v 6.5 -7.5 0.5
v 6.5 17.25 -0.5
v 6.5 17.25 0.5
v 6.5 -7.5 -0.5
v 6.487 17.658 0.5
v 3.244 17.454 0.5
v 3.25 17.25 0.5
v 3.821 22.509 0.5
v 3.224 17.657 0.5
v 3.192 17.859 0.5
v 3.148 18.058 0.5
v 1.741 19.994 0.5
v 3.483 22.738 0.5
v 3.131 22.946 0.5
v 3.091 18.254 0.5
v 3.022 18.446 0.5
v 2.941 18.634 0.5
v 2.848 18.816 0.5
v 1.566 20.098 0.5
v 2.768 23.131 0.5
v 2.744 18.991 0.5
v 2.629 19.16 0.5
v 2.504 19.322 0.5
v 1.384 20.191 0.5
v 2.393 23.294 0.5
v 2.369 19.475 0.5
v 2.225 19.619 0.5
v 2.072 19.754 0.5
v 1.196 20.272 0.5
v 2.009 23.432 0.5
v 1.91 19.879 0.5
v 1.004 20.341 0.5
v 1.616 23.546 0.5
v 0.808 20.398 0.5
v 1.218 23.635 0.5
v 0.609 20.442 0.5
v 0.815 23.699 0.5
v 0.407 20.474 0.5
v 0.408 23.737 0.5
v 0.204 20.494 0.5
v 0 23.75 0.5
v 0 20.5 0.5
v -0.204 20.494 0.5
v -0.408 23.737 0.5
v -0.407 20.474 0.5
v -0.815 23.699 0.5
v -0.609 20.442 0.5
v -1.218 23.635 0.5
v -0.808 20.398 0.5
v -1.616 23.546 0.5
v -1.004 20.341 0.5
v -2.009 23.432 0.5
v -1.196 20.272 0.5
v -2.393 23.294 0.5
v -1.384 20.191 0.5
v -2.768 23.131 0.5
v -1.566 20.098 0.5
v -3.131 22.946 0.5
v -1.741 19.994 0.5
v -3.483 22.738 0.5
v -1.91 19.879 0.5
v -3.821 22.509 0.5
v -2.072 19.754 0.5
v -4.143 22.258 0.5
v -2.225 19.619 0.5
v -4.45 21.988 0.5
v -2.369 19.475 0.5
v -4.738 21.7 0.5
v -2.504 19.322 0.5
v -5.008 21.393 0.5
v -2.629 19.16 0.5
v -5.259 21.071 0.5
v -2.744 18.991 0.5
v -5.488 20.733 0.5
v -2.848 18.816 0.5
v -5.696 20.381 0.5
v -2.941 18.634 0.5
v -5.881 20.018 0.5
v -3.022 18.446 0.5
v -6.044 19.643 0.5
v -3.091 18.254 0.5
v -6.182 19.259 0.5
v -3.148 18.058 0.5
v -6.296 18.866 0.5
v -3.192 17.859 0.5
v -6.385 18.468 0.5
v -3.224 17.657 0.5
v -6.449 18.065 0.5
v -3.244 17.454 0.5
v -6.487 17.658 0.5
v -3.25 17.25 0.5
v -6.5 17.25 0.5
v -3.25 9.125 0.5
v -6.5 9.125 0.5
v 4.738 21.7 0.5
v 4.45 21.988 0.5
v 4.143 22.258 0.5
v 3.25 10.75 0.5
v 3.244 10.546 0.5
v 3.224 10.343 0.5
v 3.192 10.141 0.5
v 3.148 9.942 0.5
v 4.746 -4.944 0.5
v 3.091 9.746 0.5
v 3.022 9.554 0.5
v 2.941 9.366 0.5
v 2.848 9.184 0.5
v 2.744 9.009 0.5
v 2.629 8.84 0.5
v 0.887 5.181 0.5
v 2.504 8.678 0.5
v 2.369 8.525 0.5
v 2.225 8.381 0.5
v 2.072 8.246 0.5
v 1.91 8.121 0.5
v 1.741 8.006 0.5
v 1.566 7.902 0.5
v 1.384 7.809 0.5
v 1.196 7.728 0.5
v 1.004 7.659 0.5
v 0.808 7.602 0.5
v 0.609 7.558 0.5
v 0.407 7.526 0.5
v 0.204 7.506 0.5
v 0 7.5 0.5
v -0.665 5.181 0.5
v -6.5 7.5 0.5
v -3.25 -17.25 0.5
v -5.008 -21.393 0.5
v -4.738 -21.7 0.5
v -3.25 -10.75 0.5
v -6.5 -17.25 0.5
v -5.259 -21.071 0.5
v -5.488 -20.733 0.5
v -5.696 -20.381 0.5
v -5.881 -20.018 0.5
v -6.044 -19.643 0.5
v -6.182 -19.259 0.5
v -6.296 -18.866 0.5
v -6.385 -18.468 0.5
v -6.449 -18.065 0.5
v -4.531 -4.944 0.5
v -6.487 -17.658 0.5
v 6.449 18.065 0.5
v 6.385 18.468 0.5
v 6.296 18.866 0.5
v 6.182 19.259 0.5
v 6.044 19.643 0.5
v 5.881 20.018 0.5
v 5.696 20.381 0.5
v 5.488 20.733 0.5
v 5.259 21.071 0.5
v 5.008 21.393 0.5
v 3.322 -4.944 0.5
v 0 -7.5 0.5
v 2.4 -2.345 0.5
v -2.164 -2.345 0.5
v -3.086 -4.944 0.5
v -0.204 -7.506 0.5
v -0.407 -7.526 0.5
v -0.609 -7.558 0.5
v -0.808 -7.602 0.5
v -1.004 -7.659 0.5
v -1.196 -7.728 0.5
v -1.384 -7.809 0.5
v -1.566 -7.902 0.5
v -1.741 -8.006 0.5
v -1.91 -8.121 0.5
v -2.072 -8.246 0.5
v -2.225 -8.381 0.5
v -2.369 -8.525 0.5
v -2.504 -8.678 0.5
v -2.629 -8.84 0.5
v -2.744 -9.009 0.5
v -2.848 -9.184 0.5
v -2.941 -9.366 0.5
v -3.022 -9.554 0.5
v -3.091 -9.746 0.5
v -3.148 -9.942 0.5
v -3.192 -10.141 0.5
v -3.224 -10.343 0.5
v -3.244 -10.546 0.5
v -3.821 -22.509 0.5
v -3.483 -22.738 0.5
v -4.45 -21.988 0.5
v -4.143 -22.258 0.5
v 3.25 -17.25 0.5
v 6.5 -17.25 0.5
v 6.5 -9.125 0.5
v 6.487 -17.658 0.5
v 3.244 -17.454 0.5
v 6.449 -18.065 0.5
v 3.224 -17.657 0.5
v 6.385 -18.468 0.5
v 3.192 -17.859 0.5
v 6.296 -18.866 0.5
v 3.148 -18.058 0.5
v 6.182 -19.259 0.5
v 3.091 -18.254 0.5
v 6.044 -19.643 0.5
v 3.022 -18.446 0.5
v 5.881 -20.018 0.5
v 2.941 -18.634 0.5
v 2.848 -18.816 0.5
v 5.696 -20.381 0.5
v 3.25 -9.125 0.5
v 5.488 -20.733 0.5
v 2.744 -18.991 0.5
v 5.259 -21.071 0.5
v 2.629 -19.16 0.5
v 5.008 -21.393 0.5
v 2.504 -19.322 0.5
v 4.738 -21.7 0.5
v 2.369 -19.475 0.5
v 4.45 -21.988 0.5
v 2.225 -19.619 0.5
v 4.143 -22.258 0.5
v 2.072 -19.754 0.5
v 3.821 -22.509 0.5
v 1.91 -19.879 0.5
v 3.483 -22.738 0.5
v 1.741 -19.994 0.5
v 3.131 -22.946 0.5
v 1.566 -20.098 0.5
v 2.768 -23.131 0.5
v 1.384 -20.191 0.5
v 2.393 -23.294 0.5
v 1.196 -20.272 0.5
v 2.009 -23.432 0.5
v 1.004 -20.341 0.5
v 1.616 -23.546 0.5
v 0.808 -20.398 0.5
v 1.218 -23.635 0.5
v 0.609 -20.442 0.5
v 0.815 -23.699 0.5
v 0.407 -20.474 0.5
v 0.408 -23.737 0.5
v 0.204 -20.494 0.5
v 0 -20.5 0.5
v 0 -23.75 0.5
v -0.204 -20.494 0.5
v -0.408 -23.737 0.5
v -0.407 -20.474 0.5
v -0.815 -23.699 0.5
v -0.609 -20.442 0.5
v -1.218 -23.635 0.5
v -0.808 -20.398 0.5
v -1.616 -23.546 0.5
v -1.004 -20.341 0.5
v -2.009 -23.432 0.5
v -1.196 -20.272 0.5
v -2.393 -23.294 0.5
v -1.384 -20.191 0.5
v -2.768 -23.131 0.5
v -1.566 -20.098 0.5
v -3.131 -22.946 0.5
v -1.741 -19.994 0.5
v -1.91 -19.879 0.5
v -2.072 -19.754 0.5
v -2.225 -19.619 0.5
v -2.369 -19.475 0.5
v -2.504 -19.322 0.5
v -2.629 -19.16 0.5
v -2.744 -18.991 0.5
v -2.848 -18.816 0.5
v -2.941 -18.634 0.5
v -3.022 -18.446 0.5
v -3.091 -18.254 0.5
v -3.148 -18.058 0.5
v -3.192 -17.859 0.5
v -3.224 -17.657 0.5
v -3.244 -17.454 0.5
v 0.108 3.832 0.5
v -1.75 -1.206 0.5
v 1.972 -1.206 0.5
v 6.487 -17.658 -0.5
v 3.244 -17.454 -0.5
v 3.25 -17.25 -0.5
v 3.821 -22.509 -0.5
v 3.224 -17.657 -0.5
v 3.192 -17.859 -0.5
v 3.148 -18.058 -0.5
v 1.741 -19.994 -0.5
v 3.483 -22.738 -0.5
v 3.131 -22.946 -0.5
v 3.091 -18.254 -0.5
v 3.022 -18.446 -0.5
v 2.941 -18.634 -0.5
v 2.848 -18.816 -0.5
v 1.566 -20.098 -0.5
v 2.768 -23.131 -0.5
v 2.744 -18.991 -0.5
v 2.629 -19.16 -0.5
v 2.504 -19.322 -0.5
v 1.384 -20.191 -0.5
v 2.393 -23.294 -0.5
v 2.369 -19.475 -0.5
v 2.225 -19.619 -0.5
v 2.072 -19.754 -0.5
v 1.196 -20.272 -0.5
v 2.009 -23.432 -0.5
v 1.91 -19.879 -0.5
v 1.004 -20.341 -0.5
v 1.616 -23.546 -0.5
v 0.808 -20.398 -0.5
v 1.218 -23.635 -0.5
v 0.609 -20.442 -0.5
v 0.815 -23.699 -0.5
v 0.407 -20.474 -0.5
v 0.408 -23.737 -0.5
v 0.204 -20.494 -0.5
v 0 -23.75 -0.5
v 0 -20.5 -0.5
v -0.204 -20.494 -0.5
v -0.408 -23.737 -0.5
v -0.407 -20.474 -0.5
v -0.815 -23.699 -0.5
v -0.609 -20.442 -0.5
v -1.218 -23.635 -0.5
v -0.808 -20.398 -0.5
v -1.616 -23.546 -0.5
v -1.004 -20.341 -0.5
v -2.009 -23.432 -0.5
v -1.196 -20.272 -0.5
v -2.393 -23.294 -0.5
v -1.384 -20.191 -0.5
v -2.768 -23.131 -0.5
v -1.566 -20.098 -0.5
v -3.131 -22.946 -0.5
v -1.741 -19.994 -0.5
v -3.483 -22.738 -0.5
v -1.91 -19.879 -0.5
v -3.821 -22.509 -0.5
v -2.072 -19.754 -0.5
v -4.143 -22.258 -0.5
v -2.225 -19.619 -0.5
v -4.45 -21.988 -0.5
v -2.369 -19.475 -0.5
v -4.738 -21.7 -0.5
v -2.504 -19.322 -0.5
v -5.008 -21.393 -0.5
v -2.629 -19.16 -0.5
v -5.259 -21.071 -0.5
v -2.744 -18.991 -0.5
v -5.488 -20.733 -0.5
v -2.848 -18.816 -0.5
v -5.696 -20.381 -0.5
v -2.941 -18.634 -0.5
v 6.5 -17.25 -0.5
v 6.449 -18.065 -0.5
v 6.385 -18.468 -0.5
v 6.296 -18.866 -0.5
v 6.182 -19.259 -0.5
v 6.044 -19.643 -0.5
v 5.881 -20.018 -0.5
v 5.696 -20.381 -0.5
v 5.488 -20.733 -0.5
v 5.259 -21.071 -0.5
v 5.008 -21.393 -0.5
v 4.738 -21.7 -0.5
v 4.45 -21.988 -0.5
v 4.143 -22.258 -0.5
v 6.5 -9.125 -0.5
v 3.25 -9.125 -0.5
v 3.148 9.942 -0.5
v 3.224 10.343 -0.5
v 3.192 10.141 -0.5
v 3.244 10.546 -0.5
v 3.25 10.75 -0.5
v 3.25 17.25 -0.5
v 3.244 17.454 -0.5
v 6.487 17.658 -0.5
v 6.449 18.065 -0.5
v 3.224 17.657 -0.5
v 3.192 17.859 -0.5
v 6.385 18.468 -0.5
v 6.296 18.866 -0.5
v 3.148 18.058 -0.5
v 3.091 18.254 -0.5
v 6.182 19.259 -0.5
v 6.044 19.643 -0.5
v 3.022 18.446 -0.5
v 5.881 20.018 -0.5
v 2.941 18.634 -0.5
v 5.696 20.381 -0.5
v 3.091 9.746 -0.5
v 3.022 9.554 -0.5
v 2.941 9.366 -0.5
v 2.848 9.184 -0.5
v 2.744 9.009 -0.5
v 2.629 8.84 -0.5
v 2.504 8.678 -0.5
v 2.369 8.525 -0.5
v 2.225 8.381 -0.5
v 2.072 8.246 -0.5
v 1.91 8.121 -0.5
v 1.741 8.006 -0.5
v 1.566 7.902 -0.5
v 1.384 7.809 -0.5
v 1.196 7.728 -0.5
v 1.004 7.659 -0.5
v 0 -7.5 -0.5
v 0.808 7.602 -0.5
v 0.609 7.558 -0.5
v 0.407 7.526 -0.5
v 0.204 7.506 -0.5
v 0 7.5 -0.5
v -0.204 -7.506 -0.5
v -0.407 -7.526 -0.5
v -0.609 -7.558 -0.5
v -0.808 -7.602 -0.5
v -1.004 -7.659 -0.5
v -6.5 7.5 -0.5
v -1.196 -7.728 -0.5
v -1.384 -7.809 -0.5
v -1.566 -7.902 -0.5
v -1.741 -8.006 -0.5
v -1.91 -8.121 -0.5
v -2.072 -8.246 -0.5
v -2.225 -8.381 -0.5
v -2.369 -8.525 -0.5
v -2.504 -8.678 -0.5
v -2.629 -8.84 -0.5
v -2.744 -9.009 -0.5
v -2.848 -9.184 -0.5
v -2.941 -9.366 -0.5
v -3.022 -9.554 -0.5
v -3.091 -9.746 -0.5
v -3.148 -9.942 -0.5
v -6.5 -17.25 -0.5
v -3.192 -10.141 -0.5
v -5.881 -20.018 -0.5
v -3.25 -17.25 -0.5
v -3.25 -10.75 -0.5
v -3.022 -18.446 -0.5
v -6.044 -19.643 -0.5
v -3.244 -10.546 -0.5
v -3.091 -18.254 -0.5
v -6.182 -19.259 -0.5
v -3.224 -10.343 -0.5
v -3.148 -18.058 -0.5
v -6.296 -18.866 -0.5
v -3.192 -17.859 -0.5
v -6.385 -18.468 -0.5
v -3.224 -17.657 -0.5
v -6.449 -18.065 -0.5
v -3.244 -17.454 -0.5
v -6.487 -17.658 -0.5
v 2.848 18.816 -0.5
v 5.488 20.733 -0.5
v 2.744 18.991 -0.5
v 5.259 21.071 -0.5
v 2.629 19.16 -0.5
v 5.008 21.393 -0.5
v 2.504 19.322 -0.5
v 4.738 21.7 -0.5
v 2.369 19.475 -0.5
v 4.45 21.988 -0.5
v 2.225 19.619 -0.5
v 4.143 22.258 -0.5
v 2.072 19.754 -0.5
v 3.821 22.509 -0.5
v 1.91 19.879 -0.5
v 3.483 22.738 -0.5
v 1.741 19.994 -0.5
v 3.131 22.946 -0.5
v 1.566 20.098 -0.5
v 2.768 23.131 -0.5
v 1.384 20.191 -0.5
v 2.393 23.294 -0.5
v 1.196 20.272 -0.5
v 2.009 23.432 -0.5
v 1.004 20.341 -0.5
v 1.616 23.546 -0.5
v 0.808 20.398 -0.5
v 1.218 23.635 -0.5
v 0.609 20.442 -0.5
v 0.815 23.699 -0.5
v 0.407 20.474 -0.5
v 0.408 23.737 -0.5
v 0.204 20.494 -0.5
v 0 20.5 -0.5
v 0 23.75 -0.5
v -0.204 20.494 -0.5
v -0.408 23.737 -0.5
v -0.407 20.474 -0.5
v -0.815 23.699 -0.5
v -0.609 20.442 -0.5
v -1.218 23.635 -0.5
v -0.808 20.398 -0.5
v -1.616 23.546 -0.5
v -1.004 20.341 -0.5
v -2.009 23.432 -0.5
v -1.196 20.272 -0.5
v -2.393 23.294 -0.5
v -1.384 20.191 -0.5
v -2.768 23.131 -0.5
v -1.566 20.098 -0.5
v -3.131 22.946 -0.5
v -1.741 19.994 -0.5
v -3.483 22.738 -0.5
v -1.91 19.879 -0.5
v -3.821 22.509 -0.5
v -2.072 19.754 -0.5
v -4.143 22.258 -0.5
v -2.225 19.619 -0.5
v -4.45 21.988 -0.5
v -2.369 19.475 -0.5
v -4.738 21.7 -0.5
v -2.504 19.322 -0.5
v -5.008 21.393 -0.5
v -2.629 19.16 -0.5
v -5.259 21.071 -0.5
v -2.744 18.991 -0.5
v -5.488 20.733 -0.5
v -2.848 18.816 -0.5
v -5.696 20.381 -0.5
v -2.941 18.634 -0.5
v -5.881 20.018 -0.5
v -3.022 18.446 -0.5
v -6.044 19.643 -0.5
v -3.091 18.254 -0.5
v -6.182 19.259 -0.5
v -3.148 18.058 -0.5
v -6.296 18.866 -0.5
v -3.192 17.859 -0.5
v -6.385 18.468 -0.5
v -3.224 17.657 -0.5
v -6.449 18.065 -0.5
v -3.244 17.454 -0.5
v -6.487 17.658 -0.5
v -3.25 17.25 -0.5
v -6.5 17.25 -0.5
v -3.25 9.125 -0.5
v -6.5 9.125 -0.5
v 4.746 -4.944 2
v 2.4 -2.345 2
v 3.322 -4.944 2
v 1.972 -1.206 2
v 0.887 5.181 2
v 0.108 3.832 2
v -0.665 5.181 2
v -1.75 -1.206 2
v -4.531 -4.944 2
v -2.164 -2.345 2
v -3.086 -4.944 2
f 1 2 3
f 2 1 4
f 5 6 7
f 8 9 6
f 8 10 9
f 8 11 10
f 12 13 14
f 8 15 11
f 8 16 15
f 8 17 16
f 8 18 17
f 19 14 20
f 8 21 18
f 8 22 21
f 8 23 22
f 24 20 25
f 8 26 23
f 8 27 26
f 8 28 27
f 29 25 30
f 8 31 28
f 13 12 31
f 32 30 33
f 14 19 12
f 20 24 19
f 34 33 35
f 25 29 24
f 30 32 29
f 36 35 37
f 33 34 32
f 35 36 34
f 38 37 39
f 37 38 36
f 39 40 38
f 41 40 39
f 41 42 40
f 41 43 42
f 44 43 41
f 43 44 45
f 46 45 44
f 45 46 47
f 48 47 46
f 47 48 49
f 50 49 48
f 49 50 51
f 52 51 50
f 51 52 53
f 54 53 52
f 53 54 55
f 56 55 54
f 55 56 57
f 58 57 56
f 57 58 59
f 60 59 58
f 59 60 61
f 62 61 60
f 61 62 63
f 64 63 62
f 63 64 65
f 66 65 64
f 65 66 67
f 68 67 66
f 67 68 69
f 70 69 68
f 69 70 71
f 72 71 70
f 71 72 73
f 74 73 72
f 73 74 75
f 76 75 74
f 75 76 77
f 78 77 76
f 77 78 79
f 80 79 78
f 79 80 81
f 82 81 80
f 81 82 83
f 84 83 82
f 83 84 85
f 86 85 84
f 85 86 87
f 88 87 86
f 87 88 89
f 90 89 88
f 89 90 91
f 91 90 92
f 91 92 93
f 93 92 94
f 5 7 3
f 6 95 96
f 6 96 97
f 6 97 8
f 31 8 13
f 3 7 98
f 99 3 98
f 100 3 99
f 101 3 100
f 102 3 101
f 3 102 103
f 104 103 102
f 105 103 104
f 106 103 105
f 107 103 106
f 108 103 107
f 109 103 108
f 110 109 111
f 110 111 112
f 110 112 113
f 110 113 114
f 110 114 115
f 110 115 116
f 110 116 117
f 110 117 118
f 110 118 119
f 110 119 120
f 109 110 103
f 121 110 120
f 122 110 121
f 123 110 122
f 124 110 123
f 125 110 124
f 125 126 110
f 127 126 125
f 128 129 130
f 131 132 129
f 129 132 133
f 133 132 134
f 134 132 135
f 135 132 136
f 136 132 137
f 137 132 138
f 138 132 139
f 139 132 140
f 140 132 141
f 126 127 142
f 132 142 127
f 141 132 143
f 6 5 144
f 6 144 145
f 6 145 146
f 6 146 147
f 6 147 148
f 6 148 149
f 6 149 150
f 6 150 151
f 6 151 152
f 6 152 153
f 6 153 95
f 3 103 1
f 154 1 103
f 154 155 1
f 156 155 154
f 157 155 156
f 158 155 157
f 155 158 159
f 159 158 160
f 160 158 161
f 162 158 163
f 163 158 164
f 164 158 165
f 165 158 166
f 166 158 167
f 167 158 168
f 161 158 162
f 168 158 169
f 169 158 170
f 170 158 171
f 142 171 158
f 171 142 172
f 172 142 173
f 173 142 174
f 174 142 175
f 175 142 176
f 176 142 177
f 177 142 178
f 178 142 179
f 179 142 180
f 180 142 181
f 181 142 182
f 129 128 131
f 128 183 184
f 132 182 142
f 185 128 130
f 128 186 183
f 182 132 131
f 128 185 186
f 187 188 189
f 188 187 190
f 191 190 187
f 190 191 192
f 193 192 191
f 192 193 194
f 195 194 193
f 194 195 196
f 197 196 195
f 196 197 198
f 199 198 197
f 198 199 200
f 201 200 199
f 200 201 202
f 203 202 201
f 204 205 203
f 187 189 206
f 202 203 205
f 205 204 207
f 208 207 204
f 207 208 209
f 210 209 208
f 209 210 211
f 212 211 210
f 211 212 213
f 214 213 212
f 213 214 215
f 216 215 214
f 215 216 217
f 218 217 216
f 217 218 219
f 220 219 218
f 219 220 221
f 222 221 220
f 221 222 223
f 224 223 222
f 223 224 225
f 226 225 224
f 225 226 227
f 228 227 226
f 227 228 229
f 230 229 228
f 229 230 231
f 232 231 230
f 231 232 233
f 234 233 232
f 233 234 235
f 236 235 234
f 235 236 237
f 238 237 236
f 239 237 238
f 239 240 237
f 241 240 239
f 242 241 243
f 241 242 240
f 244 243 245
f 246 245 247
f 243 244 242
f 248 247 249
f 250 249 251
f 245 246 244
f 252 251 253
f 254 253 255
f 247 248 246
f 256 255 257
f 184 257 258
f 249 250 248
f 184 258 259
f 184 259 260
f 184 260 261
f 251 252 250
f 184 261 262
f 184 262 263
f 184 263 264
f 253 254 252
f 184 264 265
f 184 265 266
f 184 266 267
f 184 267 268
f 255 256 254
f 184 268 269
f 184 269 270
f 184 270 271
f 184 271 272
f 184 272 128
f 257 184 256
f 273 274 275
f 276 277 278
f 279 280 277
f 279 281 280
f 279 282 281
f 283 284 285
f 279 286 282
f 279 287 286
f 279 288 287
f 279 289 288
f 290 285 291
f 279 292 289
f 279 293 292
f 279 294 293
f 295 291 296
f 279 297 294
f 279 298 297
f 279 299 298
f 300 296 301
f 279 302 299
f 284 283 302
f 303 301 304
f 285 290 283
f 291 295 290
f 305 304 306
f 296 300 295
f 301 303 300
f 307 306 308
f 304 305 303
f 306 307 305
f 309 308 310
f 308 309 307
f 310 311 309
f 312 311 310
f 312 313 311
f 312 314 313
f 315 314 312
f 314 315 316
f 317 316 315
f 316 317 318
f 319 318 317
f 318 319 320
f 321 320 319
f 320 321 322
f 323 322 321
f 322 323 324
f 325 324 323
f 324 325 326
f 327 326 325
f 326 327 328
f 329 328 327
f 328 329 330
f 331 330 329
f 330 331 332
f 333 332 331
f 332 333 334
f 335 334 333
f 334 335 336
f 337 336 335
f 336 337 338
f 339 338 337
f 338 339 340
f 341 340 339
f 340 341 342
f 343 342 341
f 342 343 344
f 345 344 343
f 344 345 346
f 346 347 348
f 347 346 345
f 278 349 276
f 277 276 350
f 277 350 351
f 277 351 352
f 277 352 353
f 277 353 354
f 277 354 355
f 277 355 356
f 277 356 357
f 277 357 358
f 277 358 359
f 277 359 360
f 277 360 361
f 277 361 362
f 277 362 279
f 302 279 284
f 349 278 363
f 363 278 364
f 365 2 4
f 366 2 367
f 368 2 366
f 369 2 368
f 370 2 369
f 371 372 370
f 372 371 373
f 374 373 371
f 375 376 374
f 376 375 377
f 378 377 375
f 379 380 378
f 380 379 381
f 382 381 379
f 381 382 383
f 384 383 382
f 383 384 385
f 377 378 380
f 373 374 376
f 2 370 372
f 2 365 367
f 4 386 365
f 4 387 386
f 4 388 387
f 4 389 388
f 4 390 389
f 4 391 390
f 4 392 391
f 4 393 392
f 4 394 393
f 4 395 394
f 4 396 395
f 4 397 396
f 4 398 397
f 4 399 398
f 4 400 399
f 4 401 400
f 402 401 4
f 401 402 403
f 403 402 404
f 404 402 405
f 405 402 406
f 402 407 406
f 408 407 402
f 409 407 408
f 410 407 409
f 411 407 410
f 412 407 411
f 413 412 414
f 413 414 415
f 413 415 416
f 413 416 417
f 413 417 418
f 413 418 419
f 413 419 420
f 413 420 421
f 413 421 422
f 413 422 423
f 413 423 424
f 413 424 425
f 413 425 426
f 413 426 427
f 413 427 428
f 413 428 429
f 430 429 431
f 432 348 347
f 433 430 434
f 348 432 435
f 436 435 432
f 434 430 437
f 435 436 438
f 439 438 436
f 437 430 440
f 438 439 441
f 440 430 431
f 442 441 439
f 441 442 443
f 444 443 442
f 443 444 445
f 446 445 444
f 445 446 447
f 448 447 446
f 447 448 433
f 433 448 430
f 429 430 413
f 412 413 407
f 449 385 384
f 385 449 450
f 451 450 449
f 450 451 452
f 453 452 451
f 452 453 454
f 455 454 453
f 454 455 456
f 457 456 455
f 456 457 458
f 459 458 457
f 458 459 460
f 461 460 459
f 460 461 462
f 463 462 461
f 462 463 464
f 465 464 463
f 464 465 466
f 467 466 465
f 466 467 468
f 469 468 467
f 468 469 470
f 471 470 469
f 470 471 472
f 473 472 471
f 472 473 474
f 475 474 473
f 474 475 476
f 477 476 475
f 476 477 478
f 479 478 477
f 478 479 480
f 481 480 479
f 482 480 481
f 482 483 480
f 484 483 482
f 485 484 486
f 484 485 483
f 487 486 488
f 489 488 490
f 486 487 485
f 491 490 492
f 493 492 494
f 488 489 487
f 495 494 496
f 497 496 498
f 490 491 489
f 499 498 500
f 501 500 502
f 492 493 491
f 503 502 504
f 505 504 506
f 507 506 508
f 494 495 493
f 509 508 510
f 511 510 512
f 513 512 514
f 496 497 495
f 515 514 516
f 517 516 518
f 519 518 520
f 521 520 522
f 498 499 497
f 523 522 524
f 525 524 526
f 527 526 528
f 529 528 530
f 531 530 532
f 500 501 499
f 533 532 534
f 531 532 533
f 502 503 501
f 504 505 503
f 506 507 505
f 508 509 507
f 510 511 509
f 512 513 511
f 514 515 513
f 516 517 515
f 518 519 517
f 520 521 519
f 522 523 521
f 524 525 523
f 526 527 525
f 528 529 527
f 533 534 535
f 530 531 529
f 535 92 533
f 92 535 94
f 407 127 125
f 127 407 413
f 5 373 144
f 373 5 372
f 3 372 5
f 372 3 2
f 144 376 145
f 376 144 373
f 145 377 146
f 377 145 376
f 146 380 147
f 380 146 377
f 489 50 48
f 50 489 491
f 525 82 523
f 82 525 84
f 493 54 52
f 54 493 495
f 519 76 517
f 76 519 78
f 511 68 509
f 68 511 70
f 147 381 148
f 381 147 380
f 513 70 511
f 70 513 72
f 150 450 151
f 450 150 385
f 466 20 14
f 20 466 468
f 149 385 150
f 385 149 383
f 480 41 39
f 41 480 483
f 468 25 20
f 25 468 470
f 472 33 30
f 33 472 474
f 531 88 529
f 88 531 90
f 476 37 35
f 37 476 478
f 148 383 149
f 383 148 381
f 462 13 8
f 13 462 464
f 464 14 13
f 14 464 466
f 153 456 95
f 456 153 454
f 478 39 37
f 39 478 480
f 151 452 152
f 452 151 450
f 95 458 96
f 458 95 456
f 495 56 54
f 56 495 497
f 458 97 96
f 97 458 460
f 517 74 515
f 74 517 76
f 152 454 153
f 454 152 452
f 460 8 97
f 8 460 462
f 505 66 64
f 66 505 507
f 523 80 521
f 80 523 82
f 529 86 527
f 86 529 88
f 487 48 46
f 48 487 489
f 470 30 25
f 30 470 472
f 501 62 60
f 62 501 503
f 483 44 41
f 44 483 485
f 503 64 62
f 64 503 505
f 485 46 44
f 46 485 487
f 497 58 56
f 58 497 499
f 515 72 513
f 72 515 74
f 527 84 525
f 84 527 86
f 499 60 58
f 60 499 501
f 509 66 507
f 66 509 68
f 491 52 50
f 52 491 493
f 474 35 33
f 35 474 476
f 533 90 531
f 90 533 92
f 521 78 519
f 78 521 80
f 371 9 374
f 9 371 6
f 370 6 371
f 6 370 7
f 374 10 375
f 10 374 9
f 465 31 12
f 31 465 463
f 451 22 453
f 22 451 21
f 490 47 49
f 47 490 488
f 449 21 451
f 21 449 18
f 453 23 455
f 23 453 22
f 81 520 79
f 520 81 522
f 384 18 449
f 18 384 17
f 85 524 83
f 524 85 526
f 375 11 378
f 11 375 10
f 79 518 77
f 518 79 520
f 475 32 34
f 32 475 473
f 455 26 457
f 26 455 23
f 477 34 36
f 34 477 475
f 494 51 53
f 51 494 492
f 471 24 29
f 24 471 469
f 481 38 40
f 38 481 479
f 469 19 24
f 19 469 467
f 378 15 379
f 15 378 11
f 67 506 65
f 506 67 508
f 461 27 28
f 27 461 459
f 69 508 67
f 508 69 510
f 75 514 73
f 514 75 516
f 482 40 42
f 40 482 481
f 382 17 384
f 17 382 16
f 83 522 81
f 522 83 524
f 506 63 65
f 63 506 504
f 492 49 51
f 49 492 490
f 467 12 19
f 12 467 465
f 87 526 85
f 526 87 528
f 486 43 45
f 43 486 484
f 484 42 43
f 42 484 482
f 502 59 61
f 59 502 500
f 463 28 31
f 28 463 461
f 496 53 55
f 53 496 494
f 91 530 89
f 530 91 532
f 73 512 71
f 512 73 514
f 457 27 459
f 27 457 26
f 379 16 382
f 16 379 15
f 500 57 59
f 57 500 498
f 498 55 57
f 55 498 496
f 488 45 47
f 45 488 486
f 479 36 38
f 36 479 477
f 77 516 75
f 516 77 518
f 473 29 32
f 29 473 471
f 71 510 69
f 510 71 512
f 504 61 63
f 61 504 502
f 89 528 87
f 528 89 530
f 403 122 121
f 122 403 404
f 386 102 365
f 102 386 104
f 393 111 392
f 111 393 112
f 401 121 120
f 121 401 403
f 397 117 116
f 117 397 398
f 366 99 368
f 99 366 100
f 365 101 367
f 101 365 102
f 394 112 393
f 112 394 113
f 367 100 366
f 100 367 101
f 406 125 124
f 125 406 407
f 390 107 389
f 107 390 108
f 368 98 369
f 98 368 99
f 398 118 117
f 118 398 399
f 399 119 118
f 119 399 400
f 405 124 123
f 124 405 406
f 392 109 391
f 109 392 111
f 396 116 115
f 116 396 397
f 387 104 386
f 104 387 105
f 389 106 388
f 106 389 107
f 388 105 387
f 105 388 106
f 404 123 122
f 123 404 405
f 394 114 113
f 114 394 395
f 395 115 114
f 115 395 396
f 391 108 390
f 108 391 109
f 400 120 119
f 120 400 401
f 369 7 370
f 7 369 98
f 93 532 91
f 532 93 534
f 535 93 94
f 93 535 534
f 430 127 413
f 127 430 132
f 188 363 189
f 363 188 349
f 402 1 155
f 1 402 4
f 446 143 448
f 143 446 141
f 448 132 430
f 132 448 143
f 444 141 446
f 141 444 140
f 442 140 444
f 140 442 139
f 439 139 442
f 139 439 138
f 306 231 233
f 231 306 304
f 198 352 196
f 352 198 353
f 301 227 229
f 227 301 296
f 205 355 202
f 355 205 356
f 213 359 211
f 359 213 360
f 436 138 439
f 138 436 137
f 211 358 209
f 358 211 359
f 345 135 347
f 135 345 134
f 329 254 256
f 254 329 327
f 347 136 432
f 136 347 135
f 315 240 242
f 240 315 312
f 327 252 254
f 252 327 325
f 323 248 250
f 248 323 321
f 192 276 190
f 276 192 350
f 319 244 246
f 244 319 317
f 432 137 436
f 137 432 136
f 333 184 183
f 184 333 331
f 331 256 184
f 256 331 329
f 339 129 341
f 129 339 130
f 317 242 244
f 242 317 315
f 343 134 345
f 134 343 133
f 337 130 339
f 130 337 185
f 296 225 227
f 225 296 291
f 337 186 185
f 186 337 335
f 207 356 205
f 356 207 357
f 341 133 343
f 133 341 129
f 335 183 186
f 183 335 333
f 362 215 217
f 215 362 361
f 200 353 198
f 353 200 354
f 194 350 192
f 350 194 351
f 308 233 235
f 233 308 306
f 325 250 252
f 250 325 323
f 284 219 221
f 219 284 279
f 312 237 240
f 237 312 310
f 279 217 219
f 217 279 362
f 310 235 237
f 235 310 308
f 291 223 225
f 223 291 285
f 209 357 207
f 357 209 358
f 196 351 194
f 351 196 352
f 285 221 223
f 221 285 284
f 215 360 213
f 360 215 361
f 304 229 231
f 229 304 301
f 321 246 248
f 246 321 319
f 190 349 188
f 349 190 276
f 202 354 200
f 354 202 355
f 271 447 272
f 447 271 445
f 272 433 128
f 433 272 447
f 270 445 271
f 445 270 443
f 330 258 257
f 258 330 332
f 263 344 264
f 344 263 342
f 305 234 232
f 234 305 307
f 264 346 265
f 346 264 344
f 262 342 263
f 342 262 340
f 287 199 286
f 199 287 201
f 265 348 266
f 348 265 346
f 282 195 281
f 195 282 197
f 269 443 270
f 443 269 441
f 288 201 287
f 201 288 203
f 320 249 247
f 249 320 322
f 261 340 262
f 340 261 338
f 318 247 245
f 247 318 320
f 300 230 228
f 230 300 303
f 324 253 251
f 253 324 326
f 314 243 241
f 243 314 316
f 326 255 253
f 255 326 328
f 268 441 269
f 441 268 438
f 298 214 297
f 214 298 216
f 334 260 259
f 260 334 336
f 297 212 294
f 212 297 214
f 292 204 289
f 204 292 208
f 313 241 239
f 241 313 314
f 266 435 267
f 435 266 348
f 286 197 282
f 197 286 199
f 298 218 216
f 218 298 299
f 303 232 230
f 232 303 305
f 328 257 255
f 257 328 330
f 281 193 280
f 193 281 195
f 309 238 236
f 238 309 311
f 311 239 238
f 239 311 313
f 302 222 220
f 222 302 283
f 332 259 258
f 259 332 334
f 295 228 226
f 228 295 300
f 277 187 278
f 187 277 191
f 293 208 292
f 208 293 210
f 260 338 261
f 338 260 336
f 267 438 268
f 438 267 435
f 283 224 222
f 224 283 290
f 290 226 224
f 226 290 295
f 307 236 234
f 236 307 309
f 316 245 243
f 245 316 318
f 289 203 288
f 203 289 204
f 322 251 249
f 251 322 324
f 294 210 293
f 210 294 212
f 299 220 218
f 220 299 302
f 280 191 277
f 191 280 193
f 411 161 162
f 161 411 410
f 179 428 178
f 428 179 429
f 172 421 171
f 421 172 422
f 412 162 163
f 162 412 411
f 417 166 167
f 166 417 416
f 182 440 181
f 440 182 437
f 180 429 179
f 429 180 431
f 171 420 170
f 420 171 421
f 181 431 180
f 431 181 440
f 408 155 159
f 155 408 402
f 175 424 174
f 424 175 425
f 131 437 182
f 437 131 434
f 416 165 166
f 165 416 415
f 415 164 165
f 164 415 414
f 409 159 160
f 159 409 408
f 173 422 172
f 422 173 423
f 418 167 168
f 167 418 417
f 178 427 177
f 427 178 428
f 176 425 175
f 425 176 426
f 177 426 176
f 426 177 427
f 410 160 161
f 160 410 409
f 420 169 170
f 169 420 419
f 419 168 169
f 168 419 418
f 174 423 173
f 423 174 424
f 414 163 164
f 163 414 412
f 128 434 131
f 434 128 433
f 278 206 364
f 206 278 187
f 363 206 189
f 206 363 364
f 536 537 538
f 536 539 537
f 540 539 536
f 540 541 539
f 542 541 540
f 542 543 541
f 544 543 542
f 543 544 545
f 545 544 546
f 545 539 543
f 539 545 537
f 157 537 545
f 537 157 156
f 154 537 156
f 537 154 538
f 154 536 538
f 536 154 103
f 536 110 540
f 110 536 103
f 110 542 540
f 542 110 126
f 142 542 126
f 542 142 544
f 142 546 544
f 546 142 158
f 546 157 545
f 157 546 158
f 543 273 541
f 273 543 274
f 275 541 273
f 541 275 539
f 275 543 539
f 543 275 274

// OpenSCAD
//Thanks to wstein and his customizable multiline tag and keychain
//https://www.thingiverse.com/thing:739573
// from where I got the list of fonts


// preview[view:south, tilt:top]

/* [Shape] */
//should be a bit bigger than the actual diameter of your cable (maybe by 1mm)
cable_diameter=6.5;

//the bit between the hooks
main_body_length=15;//[3:150]

//the minimum value for this is twice the cable diameter
main_body_width=13;//[3:150]
//of the body and hooks. This needs to bend around the cable so better to keep this relatively thin (I use 1mm).
thickness=1;//[0.4:0.1:2.5]


/* [Text] */
text="A";
text_thickness=2;
text_size=10;
text_font="Acme"; //[Abril Fatface,Aclonica,Acme,Advent Pro,Akronim,Aladin,Alegreya,Alegreya Sans,Alegreya SC,Alex Brush,Alfa Slab One,Alice,Amaranth,Architects Daughter,Archivo Black,Archivo Narrow,Arimo,Arvo,Asap,Astloch,Asul,Averia Libre,Averia Serif Libre,Bangers,Basic,Belgrano,Berkshire Swash,Bigshot One,Bilbo Swash Caps,Black Ops One,Bonbon,Bowlby One SC,Brawler,Bubblegum Sans,Butterfly Kids,Cabin Condensed,Caesar Dressing,Cagliostro,Calligraffitti,Capriola,Carter One,Changa One,Chango,Chelsea Market,Cherry Cream Soda,Chewy,Chicle,Chivo,Clicker Script,Coming Soon,Concert One,Condiment,Cookie,Courgette,Covered By Your Grace,Crimson Text,Dancing Script,DejaVu Sans,DejaVu Serif,Dhurjati,Doppio One,Dosis,Droid Sans,Eagle Lake,Electrolize,Emilys Candy,Encode Sans,Encode Sans Compressed,Euphoria Script,Exo,Exo 2,Faster One,Federo,Finger Paint,Fjord One,Fontdiner Swanky,Freckle Face,Fruktur,Gabriela,Geo,Germania One,Give You Glory,Gloria Hallelujah,Goudy Bookletter 1911,Graduate,Grand Hotel,Great Vibes,Griffy,Hanalei Fill,Happy Monkey,Henny Penny,Hind,IM Fell English SC,Indie Flower,Irish Grover,Italianno,Jacques Francois Shadow,Jolly Lodger,Josefin Slab,Joti One,Judson,Just Another Hand,Kalam,Kameron,Karma,Kavoon,Knewave,Kranky,Kristi,Laila,Lakki Reddy,Lancelot,Lato,Leckerli One,Ledger,Lekton,Lemon One,Liberation Sans,Libre Caslon Text,Life Savers,Lilita One,Lily Script One,Limelight,Lobster,Lobster Two,Londrina Outline,Londrina Shadow,Londrina Solid,Lora,Love Ya Like A Sister,Loved by the King,Lovers Quarrel,Luckiest Guy,Lusitana,Macondo,Macondo Swash Caps,Mako,Marck Script,Margarine,Marko One,Maven Pro,McLaren,MedievalSharp,Merienda One,Merriweather,Mervale Script,Metal Mania,Metrophobic,Milonga,Miltonian Tattoo,Miss Fajardose,Molle,Montez,Montserrat,Mr De Haviland,Mystery Quest,Neucha,New Rocker,Niconne,Nosifer,Nothing You Could Do,Noto Sans Oriya,Noto Serif,Nova Square,Nunito,Old Standard TT,Oleo Script,Oleo Script Swash Caps,Orbitron,Oregano,Orienta,Original Surfer,Oswald,Over the Rainbow,Overlock,Oxygen,Pacifico,Paprika,Parisienne,Patrick Hand SC,Paytone One,Peralta,Permanent Marker,Piedra,Pirata One,Play,Playball,Poetsen One,Poppins,Press Start 2P,Princess Sofia,PT Mono,Qwigley,Racing Sans One,Raleway,Rancho,Ranga,Ribeye,Roboto,Roboto Condensed,Roboto Slab,Rochester,Rock Salt,Rubik One,Sail,Salsa,Sansita One,Sarina,Satisfy,Schoolbell,Seaweed Script,Sevillana,Shadows Into Light,Shadows Into Light Two,Share,Six Caps,Skranji,Source Sans Pro,Spicy Rice,Stardos Stencil,Stoke,Syncopate,Teko,Terminal Dosis,The Girl Next Door,Tillana,Timmana,Titillium Web,Ubuntu,Ultra,Underdog,UnifrakturCook,UnifrakturMaguntia,Vampiro One,Vidaloka,Viga,Voces,Volkhov,Vollkorn,Voltaire,Waiting for the Sunrise,Wallpoet,Wellfleet,Wendy One,Yellowtail,Yesteryear,Zeyada]

rotate_text="perpendicular";//[perpendicular,parallel]

/* [Hidden] */
$fn=100;
main_body_width_use=max([cable_diameter*2,main_body_width]);
//main body

union()
{
    cube([main_body_width_use,main_body_length,thickness],center=true);
     
    //hook 1
    translate([0,main_body_length/2, 0,])
        hook(cable_diameter,thickness);
    //hook 2
        rotate(180)
            translate([0,main_body_length/2, 0,]) 
                hook(cable_diameter,thickness);
 
    if(rotate_text=="parallel")
    {    linear_extrude(height= text_thickness) 
            rotate(270)
                translate([0,0,thickness/2]) 
                    text(str(text), font = text_font, size = text_size, halign = "center",valign = "center");
    }
    else
    {    linear_extrude(height= text_thickness) 
               translate([0,0,thickness/2]) 
                    text(str(text), font = text_font, size = text_size, halign = "center",valign = "center");
    }

}
module slot(diameter, thickness){

    union()
    {   cylinder(thickness, d=diameter, center=true);
        translate([0,-diameter,0])
            cylinder(thickness, d=diameter, center=true);
        translate([0,-diameter/2,0]) 
            cube ([diameter,diameter,thickness],center=true);
        translate ([-diameter,-diameter*11/8,0])  
            cube ([diameter*2,diameter/4,thickness],center=true);
        translate([-diameter/4,-diameter,0])
            cube([diameter/2,diameter,thickness],center=true);
    }
      
}
module hook(diameter,thickness)
{
     difference(){
       union()
        {
           translate([0,diameter*3/4,0]) 
                cube([diameter*2,diameter*3/2,thickness],center=true);
           translate([0,diameter*3/2,0]) 
                cylinder(thickness, d=diameter*2, center=true);
        }
        translate([0,diameter*3/2,0]) slot(diameter, thickness*2);
    }
        
}
